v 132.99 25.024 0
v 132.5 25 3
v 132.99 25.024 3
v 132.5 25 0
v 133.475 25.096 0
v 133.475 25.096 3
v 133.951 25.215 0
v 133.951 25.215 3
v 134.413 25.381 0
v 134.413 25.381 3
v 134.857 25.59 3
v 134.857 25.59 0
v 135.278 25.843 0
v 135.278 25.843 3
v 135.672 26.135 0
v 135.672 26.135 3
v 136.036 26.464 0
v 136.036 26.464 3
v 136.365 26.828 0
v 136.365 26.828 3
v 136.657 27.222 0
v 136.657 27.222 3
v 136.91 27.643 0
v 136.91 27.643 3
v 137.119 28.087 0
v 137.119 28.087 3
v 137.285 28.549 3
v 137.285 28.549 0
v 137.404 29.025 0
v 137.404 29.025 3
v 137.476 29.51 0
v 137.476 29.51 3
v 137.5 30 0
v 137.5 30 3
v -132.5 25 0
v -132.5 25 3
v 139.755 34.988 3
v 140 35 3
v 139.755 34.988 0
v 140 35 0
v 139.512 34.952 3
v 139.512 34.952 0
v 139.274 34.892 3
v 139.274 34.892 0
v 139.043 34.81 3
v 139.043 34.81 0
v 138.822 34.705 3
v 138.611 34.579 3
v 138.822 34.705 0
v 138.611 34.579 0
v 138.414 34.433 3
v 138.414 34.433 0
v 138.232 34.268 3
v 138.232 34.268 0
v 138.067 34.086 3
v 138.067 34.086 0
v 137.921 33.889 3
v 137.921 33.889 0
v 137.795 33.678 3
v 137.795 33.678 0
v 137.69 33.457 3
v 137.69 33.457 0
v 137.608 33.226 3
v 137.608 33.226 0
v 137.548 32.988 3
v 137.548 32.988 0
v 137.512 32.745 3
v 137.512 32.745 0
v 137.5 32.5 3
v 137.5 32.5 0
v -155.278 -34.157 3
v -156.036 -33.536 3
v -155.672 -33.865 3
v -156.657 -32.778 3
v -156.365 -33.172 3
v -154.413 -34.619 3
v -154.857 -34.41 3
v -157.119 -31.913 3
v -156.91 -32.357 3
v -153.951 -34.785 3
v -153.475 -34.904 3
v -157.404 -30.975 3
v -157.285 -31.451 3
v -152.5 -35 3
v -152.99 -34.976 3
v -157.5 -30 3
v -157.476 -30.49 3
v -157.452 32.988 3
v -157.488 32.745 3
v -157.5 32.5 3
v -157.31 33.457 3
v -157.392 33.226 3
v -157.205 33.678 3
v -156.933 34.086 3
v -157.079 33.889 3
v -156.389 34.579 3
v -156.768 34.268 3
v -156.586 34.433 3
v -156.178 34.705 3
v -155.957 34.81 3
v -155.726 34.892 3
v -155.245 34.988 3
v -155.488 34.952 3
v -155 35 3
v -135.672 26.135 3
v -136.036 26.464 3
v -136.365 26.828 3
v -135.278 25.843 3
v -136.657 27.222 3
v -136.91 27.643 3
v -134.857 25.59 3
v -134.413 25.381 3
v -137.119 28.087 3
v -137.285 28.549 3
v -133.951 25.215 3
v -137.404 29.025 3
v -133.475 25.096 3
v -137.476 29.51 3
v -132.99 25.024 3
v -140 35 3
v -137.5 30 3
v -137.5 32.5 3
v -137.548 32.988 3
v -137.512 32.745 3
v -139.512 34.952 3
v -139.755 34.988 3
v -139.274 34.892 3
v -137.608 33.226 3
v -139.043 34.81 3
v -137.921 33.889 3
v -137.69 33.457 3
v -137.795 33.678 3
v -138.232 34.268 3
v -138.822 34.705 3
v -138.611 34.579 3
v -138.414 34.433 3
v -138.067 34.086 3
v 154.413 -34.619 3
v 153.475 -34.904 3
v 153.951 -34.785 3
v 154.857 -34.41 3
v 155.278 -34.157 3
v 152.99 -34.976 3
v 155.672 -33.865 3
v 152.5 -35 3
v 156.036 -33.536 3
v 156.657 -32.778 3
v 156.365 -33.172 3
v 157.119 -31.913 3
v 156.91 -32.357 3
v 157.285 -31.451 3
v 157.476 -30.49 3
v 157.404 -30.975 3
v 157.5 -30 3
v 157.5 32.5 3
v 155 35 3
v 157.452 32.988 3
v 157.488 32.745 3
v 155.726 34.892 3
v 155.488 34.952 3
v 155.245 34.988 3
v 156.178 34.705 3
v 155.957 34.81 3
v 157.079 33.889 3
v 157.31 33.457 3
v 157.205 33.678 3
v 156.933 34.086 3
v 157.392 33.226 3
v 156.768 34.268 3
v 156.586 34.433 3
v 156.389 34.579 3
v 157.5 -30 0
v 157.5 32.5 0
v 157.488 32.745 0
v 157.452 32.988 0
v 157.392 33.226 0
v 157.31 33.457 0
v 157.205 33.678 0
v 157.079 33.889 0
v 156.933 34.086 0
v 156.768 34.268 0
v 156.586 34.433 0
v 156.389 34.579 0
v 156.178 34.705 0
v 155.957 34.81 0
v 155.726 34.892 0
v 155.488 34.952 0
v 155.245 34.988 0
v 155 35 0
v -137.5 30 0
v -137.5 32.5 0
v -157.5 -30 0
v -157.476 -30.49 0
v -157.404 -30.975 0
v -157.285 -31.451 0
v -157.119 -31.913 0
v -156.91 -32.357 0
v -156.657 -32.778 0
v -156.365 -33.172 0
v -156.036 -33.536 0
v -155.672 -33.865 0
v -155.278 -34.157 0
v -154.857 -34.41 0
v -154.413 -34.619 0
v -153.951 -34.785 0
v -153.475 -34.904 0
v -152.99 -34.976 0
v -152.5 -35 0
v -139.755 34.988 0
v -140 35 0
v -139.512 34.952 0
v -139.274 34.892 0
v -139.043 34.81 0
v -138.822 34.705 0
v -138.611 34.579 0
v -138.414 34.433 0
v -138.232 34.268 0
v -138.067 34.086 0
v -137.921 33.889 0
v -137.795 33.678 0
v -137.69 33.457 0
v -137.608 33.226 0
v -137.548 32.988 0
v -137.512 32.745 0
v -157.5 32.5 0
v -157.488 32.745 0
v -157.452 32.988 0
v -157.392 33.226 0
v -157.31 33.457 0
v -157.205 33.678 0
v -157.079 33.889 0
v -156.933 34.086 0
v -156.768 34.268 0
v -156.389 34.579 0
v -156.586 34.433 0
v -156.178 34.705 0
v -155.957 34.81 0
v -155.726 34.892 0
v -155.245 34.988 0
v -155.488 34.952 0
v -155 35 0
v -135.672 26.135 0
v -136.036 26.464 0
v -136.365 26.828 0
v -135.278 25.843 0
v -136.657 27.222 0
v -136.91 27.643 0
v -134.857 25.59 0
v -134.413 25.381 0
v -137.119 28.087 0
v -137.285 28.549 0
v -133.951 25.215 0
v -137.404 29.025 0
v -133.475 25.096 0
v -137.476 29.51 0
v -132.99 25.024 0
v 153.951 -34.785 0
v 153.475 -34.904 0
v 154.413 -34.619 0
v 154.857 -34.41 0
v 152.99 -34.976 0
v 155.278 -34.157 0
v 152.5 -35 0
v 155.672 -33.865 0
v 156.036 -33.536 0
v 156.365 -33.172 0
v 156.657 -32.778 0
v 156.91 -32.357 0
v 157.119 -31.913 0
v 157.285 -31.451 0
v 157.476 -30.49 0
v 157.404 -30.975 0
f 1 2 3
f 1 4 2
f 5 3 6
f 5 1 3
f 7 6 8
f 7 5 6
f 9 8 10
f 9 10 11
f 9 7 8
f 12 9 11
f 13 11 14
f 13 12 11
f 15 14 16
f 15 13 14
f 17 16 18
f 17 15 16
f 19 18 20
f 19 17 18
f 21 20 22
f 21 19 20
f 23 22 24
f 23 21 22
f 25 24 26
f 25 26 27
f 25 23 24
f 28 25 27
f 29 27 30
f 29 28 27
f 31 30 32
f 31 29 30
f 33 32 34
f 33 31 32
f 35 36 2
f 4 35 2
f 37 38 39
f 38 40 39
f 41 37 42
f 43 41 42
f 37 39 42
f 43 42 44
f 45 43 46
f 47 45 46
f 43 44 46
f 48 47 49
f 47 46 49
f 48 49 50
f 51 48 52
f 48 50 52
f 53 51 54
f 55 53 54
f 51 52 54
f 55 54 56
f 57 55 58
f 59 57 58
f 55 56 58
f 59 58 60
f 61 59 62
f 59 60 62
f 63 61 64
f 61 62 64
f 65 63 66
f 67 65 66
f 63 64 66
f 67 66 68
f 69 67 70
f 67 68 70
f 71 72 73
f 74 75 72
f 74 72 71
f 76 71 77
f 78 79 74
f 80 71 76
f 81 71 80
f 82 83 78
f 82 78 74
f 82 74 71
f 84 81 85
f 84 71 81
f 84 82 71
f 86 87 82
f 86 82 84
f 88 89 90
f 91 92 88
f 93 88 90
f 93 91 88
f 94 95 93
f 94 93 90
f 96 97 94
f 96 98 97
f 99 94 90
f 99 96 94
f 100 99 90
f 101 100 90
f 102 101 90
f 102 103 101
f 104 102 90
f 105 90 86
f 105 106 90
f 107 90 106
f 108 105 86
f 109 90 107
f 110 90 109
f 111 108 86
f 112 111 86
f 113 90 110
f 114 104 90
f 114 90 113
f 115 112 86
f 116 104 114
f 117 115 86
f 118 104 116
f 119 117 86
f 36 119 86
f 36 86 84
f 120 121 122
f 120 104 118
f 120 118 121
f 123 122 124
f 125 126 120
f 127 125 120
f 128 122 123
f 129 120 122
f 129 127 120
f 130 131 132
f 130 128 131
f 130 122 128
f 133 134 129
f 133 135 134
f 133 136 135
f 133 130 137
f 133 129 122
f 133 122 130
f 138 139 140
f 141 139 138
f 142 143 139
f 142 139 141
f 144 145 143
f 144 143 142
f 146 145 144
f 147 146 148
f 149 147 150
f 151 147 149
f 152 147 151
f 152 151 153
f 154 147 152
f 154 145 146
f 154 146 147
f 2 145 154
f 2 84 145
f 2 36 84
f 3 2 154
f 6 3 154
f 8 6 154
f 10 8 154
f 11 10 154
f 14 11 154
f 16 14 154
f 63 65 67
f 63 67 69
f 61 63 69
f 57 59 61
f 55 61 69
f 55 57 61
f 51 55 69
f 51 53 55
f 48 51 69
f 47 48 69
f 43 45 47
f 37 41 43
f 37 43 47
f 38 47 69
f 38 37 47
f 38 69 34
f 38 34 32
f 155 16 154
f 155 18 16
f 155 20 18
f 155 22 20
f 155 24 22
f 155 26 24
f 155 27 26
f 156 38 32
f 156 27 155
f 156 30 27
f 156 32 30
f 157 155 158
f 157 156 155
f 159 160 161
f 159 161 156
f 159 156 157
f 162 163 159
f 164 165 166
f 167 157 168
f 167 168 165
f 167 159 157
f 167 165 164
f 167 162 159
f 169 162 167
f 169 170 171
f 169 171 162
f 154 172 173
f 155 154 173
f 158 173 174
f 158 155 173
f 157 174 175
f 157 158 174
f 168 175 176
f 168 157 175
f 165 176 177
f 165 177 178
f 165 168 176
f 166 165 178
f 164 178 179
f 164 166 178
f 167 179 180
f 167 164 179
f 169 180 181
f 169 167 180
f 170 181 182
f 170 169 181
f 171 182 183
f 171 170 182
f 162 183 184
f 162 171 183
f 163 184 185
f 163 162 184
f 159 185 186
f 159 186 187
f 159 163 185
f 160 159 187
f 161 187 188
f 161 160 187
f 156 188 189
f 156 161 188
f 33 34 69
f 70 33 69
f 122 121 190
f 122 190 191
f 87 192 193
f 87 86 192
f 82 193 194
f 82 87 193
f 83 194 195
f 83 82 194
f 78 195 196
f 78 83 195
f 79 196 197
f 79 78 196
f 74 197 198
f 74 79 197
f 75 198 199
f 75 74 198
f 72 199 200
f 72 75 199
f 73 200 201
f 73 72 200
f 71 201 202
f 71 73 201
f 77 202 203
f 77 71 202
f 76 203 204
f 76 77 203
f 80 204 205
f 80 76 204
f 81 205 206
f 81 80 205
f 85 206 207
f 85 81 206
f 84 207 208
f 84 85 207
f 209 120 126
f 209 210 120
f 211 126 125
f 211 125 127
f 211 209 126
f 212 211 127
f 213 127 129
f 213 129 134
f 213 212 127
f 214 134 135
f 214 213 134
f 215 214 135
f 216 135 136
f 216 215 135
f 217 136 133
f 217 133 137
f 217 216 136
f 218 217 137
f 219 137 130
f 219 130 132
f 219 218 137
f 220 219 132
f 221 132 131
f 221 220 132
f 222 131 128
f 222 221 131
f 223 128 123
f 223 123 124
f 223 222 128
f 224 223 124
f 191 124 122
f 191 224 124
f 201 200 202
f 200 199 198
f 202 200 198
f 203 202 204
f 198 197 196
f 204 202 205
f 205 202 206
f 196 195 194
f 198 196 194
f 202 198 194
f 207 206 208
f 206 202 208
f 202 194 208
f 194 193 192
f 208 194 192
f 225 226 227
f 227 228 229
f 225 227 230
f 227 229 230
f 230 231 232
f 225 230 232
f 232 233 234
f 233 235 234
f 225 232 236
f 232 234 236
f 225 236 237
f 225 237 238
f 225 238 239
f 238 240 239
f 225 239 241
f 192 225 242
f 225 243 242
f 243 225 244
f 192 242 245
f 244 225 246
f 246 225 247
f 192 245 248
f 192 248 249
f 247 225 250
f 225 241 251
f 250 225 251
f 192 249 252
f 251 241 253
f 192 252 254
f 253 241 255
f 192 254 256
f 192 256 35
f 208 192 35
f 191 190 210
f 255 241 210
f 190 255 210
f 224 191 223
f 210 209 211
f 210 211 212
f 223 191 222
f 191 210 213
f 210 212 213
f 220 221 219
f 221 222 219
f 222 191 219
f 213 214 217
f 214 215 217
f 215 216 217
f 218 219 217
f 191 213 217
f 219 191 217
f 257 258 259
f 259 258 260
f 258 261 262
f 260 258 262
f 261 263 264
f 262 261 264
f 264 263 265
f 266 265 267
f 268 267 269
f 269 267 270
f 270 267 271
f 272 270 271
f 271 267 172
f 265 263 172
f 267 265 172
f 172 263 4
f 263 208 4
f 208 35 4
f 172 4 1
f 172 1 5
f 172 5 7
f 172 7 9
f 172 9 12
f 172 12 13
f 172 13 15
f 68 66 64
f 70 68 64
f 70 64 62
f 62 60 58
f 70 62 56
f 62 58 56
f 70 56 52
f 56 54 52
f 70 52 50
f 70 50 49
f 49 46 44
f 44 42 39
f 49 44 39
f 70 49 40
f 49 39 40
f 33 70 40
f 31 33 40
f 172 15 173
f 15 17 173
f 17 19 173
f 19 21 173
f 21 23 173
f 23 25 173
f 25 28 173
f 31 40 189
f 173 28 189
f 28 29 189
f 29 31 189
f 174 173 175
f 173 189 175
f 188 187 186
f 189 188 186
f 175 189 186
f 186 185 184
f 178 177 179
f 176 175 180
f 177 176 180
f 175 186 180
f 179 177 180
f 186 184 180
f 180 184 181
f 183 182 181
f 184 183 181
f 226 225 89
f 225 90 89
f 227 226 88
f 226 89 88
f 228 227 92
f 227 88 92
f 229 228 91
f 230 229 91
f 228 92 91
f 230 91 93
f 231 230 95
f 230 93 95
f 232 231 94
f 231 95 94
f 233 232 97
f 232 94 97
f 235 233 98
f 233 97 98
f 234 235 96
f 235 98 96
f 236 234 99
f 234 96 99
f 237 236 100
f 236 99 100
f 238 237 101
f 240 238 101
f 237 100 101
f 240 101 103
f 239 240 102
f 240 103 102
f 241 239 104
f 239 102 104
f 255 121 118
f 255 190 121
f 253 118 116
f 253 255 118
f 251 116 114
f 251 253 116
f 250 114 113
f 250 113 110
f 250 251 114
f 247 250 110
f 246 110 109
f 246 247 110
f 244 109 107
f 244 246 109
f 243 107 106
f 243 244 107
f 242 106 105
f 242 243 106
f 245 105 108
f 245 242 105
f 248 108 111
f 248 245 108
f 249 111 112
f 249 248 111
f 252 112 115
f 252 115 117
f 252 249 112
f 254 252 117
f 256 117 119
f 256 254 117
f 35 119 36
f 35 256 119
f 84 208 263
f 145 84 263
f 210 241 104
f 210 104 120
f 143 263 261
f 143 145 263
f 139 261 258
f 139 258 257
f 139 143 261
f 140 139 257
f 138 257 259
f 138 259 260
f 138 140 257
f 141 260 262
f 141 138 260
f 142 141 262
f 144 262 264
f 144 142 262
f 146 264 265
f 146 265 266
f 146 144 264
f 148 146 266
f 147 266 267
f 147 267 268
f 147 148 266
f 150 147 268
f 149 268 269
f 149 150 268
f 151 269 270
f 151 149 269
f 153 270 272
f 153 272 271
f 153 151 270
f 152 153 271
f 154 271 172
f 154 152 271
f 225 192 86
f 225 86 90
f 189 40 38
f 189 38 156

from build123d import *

# Parameters (mm, degrees)
SKETCH1_W           = 315
SKETCH1_H           = 70
BOSS_EXTRUDE1_DEPTH = 3
SKETCH2_W           = 275
SKETCH2_H           = 10
CUT_EXTRUDE1_DEPTH  = 3
FILLET1_R           = 5
FILLET2_R           = 2.5


with BuildPart() as part:
    # Sketch1 → Boss-Extrude1 (new body)
    with BuildSketch(Plane.XY):
        Rectangle(SKETCH1_W, SKETCH1_H)
    extrude(amount=BOSS_EXTRUDE1_DEPTH)

    # Sketch2 → Cut-Extrude1 (cut)
    with BuildSketch(Plane.XY.offset(3)):
        with Locations((0, 30)):
            Rectangle(SKETCH2_W, SKETCH2_H)
    extrude(amount=-CUT_EXTRUDE1_DEPTH, mode=Mode.SUBTRACT)

    # Fillet1
    fillet1_edges = [part.edges().sort_by_distance(p)[0] for p in [
        (-137.5, 25, 1.5),
        (137.5, 25, 1.5),
        (157.5, -35, 1.5),
        (-157.5, -35, 1.5),
    ]]
    fillet(fillet1_edges, radius=FILLET1_R)

    # Fillet2
    fillet2_edges = [part.edges().sort_by_distance(p)[0] for p in [
        (-137.5, 35, 1.5),
        (137.5, 35, 1.5),
        (-157.5, 35, 1.5),
        (157.5, 35, 1.5),
    ]]
    fillet(fillet2_edges, radius=FILLET2_R)


solid = part.part
